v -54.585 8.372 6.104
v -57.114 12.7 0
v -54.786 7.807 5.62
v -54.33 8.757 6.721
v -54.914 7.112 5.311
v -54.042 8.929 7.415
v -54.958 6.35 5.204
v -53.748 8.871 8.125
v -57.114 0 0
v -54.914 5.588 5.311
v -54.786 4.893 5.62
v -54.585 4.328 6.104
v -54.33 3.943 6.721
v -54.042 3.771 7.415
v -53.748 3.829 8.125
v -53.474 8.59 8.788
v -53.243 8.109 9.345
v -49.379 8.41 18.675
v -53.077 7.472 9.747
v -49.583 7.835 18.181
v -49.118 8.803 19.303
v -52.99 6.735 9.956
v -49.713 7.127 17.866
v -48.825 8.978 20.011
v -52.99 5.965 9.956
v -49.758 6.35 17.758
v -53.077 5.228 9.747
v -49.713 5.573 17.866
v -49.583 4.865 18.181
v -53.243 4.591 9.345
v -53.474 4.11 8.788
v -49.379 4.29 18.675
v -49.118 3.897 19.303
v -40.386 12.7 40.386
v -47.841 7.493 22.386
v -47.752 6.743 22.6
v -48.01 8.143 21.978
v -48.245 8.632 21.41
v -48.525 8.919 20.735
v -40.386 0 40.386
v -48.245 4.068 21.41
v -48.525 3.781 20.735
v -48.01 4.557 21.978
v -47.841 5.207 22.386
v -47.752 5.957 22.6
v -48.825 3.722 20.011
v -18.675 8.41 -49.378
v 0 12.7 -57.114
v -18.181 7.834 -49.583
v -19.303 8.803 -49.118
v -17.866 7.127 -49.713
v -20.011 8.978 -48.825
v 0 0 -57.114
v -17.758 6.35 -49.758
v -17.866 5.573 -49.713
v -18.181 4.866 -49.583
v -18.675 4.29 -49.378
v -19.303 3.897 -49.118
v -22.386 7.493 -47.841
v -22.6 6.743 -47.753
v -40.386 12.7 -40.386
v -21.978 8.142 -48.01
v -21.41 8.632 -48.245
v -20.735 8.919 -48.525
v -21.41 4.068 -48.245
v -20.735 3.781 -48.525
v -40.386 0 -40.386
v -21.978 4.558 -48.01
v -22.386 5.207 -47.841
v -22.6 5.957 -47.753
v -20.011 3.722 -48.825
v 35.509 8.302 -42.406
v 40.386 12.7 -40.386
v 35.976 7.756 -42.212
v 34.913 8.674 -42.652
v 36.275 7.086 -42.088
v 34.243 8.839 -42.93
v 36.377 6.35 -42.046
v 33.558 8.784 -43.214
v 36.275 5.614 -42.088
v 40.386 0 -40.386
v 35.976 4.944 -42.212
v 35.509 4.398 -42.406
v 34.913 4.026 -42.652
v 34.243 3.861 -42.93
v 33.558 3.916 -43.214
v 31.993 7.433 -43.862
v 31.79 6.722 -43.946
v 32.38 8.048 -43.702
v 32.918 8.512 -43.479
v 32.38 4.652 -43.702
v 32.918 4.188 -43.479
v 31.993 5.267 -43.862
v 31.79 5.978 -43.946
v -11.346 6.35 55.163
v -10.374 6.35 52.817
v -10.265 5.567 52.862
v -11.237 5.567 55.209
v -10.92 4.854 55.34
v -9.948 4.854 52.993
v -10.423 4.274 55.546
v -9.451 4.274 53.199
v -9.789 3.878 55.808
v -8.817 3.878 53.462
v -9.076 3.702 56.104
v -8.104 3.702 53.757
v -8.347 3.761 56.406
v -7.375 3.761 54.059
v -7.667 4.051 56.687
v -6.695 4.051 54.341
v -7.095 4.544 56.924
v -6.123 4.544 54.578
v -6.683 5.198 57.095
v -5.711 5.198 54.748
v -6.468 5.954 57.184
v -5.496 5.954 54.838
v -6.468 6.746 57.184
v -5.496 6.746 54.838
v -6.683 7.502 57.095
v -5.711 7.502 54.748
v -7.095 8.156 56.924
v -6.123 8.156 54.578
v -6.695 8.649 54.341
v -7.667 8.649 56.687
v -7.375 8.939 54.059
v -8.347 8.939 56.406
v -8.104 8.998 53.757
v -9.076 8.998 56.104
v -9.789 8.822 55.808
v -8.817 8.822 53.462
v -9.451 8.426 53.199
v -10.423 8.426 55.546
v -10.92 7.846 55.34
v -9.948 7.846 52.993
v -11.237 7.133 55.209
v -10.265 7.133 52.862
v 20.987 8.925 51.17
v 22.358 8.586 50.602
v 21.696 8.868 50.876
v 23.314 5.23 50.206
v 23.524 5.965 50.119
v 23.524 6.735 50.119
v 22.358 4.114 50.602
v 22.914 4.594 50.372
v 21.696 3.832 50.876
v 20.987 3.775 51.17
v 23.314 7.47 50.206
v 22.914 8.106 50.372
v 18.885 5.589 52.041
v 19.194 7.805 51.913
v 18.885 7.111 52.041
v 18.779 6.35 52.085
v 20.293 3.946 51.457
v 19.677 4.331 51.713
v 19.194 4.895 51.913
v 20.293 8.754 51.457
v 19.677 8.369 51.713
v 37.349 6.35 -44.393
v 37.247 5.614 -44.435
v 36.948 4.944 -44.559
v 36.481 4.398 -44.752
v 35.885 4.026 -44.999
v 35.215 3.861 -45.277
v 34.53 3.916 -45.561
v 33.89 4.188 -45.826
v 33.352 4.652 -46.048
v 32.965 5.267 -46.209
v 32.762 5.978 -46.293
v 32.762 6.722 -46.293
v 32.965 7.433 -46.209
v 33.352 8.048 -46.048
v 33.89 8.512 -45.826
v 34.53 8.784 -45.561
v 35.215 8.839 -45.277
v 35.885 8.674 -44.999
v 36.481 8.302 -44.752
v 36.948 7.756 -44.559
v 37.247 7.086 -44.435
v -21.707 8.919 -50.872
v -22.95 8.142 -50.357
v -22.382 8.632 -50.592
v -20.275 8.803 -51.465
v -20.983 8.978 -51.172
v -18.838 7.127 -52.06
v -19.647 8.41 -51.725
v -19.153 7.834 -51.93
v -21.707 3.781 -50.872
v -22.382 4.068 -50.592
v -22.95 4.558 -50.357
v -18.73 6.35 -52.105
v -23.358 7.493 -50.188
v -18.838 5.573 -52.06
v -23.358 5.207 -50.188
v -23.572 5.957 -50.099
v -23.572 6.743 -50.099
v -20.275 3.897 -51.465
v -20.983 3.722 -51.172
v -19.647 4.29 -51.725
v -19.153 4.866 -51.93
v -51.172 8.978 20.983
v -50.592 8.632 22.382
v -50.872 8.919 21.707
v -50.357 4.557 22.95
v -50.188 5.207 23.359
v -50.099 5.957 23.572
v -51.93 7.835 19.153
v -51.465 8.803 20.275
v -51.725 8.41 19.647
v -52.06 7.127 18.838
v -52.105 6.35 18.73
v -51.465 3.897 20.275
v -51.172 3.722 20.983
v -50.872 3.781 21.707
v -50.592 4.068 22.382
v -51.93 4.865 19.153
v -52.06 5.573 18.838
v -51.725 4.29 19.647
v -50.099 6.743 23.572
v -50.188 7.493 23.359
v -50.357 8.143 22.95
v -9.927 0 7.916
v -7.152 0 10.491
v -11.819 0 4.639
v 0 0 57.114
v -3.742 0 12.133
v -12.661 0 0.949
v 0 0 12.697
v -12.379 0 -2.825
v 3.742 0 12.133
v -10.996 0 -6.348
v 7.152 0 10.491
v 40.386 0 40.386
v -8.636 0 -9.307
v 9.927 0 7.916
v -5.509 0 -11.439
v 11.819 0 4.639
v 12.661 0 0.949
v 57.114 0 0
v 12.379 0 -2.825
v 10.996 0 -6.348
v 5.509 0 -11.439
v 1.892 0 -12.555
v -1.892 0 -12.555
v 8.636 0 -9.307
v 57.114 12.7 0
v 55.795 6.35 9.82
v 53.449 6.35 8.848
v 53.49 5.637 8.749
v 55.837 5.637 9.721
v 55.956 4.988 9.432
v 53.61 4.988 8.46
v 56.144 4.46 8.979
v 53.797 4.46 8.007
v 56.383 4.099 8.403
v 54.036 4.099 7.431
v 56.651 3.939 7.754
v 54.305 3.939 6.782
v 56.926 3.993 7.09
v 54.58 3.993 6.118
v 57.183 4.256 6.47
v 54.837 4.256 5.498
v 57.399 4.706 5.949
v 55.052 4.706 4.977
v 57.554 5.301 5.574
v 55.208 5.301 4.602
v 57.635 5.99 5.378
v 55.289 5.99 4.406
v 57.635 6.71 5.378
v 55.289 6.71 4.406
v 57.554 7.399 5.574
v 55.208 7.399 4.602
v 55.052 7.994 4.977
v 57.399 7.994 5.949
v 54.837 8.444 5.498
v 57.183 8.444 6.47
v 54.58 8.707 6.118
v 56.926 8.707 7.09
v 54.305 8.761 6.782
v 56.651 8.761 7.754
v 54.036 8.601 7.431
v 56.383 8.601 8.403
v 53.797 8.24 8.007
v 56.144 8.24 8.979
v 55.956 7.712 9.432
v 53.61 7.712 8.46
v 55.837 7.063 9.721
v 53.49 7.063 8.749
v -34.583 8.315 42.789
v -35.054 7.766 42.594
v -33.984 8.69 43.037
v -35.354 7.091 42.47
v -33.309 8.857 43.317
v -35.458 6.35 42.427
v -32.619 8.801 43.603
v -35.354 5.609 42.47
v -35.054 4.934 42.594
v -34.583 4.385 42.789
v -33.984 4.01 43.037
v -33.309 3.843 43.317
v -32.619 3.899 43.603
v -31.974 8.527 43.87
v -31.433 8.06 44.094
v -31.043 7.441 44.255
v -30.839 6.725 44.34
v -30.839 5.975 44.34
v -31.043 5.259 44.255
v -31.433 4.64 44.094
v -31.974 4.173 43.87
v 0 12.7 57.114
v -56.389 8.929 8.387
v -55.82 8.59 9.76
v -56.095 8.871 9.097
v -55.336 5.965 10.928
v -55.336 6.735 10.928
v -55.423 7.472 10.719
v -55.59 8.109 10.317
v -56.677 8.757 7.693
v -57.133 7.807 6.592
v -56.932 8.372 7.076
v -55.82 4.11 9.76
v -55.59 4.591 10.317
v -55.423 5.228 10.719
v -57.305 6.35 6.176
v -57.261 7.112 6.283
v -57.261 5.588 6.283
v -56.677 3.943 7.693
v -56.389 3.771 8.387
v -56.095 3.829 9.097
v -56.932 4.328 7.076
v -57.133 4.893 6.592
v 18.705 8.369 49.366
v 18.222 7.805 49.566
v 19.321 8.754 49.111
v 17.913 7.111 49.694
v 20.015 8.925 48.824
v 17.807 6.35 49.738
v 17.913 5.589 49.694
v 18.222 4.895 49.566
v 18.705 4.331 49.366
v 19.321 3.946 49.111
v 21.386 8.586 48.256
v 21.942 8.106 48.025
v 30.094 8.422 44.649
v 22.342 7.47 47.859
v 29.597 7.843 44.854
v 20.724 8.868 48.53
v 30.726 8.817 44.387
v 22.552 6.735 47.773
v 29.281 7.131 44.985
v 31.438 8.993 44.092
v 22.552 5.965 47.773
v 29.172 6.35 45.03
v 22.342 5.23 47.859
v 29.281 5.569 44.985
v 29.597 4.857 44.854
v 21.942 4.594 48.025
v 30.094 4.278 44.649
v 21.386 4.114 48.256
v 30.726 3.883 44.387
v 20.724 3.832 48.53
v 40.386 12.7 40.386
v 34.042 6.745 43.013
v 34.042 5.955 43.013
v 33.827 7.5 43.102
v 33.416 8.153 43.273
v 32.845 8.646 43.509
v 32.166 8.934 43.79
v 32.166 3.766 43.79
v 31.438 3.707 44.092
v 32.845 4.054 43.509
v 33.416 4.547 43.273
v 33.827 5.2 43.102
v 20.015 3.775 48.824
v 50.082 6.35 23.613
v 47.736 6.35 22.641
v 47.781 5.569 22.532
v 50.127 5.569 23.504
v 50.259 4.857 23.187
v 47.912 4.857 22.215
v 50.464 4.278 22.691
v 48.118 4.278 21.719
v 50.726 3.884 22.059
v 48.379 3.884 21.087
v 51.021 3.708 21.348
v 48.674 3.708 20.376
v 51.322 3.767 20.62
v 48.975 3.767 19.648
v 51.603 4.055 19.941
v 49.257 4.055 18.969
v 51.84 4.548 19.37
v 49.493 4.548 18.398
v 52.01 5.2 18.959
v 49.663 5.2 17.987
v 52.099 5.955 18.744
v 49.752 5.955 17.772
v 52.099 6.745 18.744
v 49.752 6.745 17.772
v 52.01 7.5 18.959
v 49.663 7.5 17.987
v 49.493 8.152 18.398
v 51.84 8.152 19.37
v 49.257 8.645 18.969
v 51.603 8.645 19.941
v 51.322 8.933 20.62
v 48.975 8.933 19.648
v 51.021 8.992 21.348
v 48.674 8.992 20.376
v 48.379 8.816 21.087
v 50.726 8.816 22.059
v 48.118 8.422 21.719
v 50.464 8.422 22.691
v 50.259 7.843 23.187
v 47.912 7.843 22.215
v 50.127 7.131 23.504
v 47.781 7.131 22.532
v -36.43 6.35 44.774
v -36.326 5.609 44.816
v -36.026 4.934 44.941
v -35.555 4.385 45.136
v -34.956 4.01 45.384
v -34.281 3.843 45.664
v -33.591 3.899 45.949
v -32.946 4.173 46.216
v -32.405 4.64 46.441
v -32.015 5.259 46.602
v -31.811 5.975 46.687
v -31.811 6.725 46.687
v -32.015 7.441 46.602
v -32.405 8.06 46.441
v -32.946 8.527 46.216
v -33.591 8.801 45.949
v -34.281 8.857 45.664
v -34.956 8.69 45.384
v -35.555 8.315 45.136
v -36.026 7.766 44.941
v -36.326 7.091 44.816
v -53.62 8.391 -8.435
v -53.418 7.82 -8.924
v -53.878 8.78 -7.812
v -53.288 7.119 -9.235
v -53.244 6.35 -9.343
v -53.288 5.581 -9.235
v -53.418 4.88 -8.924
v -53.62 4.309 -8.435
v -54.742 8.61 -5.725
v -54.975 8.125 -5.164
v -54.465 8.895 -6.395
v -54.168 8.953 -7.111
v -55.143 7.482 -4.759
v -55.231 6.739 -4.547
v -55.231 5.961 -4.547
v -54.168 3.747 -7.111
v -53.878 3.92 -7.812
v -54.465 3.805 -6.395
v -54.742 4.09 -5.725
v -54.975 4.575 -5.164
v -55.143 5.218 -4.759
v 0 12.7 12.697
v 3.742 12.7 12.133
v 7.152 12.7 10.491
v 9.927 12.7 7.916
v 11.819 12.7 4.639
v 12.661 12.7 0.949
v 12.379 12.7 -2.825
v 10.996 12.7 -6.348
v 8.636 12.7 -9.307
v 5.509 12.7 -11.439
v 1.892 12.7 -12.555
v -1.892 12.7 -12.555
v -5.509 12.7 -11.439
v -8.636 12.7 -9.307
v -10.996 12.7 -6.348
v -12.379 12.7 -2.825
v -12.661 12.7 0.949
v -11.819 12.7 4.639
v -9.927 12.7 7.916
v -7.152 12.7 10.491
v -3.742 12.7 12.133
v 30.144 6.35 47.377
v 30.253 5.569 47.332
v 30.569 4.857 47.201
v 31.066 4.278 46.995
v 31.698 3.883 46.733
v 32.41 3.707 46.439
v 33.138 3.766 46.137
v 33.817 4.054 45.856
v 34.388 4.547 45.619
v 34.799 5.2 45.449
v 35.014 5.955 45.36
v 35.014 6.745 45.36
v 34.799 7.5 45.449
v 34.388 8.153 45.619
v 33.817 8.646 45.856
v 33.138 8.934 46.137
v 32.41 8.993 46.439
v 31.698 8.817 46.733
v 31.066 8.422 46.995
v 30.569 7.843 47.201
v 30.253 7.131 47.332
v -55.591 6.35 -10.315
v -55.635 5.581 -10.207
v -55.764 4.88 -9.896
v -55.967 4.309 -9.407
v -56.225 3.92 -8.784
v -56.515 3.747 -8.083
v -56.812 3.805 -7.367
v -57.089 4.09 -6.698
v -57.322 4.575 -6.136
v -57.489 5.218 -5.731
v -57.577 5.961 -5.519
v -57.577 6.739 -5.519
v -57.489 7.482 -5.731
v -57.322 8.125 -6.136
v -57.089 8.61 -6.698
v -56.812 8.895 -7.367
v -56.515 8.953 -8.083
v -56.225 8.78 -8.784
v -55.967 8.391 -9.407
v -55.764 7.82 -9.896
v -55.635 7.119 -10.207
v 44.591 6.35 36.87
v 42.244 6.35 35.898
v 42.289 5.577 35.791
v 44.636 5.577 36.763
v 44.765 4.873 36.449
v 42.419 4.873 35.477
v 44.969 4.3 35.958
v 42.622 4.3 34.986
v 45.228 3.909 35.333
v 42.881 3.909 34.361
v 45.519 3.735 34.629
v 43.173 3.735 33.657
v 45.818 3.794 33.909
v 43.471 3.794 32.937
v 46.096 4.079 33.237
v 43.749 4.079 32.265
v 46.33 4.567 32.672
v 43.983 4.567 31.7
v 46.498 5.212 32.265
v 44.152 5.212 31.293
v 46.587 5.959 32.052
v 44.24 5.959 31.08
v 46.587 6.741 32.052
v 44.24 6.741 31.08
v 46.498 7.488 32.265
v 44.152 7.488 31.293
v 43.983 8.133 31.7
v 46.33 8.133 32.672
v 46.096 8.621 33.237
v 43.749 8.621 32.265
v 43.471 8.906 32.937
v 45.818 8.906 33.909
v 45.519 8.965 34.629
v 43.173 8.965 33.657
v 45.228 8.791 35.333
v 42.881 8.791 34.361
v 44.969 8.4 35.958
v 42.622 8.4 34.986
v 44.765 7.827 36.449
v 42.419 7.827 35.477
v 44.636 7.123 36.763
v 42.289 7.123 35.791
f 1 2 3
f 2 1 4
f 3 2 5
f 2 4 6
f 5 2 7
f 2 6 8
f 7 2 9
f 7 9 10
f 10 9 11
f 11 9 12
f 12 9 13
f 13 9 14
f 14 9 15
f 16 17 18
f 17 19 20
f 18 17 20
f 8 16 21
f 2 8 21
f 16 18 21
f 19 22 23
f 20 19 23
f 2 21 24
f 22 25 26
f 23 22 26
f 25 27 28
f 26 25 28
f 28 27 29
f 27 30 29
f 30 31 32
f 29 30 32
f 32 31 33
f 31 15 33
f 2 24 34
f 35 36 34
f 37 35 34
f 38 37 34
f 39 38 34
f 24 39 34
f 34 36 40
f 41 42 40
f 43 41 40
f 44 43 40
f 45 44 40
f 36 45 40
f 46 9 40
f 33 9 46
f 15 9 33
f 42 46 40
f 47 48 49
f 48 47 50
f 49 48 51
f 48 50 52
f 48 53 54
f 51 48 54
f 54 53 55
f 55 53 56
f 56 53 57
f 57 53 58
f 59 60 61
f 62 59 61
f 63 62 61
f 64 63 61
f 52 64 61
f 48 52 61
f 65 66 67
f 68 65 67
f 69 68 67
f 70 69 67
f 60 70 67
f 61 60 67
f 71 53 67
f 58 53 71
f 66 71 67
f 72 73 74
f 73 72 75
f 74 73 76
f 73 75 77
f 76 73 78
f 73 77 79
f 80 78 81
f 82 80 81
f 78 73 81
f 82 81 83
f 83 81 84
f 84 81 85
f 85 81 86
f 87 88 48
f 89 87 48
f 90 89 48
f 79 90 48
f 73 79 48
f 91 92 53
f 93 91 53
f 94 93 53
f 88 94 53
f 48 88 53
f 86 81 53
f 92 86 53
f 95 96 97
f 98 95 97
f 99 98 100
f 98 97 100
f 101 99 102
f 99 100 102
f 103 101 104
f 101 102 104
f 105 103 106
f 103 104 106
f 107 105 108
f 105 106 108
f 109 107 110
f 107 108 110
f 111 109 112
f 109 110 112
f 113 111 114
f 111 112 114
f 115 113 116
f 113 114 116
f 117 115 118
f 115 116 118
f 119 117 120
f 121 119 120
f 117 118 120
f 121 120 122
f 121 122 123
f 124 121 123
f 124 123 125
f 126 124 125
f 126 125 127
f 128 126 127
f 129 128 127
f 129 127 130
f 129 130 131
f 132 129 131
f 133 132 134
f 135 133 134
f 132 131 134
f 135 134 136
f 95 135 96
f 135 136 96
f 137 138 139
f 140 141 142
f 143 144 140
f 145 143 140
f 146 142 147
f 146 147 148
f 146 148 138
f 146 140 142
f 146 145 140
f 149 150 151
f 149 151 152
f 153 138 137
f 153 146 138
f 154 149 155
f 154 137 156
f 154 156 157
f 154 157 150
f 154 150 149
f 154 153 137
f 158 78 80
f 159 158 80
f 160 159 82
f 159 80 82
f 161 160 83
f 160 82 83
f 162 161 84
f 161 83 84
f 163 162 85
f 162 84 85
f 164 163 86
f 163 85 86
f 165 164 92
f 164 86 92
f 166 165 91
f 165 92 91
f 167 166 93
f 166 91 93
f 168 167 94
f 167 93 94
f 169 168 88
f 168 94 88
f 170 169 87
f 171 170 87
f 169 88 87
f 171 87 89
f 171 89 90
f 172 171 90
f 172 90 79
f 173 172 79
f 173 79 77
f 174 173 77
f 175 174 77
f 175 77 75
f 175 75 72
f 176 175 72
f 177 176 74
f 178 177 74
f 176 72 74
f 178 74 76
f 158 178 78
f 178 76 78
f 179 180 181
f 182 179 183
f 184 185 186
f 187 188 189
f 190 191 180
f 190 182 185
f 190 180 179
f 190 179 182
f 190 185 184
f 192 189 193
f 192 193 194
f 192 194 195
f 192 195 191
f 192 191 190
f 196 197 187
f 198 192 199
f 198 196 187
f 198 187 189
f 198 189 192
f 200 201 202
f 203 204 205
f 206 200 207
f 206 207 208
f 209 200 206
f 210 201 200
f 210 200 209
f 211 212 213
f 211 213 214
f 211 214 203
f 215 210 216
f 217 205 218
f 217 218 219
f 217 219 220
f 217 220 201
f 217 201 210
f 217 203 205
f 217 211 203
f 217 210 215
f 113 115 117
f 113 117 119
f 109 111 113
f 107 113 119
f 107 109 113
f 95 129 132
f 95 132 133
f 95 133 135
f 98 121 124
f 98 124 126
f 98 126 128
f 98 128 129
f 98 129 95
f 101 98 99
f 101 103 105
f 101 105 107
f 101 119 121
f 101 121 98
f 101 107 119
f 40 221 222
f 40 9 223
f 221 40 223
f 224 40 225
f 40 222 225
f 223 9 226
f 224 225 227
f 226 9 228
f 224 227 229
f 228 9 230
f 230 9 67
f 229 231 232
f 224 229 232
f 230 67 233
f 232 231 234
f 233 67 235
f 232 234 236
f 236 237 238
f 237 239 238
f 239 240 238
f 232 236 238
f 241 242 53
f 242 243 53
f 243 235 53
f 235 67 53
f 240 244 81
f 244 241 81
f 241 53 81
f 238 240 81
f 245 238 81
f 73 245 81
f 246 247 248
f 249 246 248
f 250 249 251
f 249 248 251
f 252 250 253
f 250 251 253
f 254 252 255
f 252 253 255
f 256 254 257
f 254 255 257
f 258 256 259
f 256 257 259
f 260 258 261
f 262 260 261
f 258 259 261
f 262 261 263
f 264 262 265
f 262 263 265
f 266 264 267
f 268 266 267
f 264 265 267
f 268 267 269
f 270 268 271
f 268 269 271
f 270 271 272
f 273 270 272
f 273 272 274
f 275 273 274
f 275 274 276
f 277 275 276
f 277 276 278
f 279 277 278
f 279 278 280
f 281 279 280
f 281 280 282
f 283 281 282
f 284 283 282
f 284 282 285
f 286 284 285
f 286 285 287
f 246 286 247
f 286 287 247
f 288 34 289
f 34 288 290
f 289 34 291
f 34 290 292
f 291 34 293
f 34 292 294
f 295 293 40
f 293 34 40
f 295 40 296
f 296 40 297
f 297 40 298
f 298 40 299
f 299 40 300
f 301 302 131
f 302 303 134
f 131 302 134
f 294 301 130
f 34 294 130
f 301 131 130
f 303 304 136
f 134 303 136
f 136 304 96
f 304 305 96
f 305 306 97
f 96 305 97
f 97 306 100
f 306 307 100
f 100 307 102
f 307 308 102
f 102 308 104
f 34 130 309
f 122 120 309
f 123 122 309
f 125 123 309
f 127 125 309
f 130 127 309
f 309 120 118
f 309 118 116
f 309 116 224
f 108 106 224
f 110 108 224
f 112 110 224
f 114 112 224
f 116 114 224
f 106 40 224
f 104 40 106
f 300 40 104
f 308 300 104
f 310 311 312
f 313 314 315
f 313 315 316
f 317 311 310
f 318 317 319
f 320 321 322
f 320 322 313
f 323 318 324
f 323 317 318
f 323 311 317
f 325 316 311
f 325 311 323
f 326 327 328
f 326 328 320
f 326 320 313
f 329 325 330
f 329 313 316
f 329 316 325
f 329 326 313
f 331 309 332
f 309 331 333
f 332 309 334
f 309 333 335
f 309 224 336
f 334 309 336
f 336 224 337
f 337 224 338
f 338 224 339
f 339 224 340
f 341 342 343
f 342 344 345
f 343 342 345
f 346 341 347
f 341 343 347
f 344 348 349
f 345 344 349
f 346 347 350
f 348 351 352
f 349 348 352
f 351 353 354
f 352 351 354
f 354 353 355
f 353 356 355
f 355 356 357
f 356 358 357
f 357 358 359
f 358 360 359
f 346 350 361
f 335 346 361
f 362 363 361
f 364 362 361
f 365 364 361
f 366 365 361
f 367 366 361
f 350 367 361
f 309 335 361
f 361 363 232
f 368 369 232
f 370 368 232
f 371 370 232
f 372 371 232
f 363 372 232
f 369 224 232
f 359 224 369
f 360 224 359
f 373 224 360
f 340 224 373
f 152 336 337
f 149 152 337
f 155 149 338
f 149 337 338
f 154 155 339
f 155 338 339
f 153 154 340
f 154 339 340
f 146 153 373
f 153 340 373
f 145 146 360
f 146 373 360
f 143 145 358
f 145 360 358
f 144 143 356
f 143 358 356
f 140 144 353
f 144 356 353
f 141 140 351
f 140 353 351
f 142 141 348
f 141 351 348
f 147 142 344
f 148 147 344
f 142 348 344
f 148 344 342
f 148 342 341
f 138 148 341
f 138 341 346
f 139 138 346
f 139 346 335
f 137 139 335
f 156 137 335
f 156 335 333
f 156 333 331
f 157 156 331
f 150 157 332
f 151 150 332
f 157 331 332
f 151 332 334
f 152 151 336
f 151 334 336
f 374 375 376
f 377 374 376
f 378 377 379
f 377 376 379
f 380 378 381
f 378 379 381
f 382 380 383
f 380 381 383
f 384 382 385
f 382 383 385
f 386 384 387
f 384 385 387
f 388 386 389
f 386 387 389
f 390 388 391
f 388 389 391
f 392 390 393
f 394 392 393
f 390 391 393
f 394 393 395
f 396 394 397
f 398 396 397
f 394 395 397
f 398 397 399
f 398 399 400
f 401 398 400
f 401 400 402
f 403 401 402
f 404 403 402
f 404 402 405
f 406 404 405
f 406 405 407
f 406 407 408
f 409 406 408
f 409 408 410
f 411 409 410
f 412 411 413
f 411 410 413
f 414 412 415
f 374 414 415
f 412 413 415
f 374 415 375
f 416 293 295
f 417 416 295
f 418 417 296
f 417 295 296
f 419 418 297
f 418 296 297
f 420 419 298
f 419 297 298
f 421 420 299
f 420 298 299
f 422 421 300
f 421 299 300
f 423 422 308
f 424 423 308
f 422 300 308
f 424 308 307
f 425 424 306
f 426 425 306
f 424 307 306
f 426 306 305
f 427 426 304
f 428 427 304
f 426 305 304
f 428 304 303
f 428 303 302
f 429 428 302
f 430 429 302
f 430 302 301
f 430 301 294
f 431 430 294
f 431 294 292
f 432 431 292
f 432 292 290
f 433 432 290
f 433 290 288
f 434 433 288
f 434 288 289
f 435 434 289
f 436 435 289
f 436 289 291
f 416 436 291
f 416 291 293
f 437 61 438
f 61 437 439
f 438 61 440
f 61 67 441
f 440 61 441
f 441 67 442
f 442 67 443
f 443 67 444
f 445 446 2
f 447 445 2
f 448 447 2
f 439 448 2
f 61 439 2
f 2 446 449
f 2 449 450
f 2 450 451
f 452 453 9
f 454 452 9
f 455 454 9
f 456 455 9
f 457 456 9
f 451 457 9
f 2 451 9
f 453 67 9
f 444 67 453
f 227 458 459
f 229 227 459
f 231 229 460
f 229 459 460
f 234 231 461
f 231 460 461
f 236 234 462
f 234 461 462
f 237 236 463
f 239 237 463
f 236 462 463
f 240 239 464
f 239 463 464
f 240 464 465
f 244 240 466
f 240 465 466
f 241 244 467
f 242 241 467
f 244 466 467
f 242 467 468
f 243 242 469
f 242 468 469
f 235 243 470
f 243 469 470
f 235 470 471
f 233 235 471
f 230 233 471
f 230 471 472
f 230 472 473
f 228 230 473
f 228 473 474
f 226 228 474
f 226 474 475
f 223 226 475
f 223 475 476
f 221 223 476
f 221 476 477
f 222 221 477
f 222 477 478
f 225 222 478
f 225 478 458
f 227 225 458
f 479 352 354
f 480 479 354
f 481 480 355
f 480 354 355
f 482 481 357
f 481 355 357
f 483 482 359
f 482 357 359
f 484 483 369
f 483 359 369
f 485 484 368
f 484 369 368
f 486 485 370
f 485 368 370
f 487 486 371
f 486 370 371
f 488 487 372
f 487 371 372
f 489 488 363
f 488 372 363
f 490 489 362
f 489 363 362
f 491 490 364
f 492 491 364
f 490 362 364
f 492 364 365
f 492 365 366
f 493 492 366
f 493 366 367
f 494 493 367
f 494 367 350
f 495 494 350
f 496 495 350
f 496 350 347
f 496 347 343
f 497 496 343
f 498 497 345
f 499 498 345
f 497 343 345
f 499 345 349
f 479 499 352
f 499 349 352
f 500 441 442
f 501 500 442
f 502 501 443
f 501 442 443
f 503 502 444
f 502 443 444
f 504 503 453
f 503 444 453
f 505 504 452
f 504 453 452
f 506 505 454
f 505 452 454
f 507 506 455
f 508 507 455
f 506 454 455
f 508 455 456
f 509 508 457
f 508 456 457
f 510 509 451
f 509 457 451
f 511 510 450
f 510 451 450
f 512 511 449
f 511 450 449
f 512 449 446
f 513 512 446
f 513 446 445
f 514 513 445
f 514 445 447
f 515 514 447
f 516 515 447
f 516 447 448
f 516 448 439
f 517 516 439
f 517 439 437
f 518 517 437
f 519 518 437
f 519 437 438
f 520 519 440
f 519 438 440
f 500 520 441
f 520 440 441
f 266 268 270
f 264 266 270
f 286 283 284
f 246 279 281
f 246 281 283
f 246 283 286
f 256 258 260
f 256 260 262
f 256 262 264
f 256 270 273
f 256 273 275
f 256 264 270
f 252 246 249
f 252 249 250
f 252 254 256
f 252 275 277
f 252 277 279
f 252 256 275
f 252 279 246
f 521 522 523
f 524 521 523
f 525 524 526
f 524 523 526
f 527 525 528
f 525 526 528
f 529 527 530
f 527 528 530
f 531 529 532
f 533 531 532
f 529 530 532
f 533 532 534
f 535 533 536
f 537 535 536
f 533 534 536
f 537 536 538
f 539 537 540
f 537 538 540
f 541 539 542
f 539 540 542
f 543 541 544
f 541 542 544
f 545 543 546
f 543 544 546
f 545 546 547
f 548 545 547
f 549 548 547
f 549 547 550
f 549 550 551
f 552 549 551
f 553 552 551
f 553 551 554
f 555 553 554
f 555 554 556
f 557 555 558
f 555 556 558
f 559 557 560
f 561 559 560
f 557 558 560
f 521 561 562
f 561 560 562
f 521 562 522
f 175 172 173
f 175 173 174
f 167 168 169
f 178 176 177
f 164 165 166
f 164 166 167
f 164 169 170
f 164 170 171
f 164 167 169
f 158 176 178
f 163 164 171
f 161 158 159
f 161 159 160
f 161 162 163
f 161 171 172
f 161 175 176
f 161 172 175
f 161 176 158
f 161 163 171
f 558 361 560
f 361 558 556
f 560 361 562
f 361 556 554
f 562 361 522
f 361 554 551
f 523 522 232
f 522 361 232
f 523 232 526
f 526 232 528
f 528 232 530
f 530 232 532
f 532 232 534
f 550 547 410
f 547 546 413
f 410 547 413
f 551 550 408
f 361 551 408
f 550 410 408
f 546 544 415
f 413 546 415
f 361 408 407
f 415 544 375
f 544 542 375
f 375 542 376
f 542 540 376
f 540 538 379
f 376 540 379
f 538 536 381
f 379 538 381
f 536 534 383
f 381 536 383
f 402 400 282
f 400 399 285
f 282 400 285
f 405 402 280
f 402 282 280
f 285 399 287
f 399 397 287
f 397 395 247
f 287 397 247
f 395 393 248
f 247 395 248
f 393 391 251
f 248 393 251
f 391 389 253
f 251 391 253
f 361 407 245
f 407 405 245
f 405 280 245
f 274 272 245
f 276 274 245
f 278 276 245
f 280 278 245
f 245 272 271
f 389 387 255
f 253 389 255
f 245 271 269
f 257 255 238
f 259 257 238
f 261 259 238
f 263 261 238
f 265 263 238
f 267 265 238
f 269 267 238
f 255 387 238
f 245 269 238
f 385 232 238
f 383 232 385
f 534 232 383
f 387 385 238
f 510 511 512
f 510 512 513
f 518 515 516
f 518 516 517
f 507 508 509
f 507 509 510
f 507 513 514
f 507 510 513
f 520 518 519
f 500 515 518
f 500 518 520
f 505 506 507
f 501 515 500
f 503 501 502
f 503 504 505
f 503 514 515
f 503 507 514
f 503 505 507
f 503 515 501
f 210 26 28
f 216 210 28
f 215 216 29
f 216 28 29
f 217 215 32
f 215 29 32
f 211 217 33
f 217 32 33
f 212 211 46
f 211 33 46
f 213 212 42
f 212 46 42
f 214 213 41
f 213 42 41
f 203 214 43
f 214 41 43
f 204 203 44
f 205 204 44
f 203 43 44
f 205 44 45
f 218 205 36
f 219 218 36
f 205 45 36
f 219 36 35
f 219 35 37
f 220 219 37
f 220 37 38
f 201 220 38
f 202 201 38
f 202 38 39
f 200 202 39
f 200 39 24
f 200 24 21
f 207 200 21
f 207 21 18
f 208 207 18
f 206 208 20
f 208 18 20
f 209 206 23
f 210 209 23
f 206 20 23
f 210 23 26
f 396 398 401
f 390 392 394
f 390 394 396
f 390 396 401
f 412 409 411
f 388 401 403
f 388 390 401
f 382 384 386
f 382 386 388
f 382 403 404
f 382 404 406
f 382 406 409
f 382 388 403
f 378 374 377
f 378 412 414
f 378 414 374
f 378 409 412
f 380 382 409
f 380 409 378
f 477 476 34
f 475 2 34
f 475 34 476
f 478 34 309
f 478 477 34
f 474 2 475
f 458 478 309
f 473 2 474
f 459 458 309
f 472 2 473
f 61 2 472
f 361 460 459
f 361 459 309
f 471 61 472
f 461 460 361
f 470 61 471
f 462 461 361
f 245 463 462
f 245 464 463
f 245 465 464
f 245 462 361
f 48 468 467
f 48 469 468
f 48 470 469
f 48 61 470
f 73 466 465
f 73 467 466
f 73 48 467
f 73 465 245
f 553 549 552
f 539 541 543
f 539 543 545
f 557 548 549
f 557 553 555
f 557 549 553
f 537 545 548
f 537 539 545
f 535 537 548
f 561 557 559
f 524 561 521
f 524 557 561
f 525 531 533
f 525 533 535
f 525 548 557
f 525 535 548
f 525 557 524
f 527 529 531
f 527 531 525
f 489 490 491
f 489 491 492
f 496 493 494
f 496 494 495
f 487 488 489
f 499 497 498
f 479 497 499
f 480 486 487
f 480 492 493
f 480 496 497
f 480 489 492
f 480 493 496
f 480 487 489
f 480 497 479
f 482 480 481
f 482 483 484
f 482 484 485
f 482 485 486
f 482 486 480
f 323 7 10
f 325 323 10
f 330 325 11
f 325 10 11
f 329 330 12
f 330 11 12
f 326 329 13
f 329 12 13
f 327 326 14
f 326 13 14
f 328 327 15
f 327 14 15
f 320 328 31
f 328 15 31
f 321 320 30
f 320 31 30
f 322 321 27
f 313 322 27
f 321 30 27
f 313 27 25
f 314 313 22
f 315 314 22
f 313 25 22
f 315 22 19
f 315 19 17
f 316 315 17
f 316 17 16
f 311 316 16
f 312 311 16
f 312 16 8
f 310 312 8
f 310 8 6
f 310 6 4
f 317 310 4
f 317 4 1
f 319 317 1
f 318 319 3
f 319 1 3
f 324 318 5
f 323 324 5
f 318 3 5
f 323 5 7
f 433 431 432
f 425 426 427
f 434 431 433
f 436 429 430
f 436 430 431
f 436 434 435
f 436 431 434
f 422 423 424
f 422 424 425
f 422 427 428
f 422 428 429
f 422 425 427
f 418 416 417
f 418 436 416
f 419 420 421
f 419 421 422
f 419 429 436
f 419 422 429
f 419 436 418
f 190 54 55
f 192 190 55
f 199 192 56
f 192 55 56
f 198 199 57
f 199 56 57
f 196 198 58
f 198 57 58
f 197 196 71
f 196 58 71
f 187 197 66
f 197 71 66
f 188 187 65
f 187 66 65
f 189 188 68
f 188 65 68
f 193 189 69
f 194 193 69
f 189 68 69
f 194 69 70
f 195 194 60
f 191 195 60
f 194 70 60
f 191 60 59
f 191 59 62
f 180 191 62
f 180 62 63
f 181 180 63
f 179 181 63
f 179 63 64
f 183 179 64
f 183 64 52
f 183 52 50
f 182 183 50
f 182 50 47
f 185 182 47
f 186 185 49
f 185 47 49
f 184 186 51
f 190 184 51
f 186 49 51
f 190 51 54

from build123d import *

# Parameters (mm, degrees)
BOSS_EXTRUDE1_DEPTH      = 12.7
SKETCH6_R                = 2.582336278
BOSS_EXTRUDE5_DEPTH      = 2.54
SKETCH8_R                = 2.650649738
BOSS_EXTRUDE7_DEPTH      = 2.54
SKETCH9_R                = 2.655151376
BOSS_EXTRUDE8_DEPTH      = 2.54
BOSS_EXTRUDE9_DEPTH      = 2.54
BOSS_EXTRUDE9_DEPTH_BACK = 2.032
SKETCH10_R               = 2.513561162
SKETCH11_R               = 2.58621177
BOSS_EXTRUDE10_DEPTH     = 2.54
SKETCH12_R               = 2.635427952
BOSS_EXTRUDE11_DEPTH     = 2.54
SKETCH13_R               = 2.610060734
BOSS_EXTRUDE12_DEPTH     = 2.54
SKETCH14_R               = 2.635257061
BOSS_EXTRUDE13_DEPTH     = 2.54
SKETCH15_R               = 2.496375984
BOSS_EXTRUDE14_DEPTH     = 2.54
SKETCH16_R               = 2.621965254
BOSS_EXTRUDE15_DEPTH     = 2.54
SKETCH17_R               = 2.649584499
BOSS_EXTRUDE16_DEPTH     = 2.54
SKETCH18_R               = 2.417668351
BOSS_EXTRUDE17_DEPTH     = 2.54
SKETCH25_R               = 12.696845274
CUT_EXTRUDE1_DEPTH       = 12.954


with BuildPart() as part:
    # Sketch2 → Boss-Extrude1 (new body)
    with BuildSketch(Plane(origin=(0, 0, 0), x_dir=(1, 0, 0), z_dir=(0, 1, 0))):
        Polygon((57.113851186, 0), (40.385591473, 40.385591473), (0, 57.113851186), (-40.385591473, 40.385591473), (-57.113851186, 0), (-40.385591473, -40.385591473), (0, -57.113851186), (40.385591473, -40.385591473), align=None)
    extrude(amount=BOSS_EXTRUDE1_DEPTH)

    # Sketch6 → Boss-Extrude5 (add)
    with BuildSketch(Plane(origin=(20.192795737, 0, 48.749721329), x_dir=(0.9238795325112822, 0, -0.38268343236510083), z_dir=(0.38268343236510083, 0, 0.9238795325112822))):
        with Locations(Location((0, 6.35, 0), (0, 0, 180))):
            Circle(SKETCH6_R)
    extrude(amount=BOSS_EXTRUDE5_DEPTH)

    # Sketch8 → Boss-Extrude7 (add)
    with BuildSketch(Plane(origin=(20.192795737, 0, 48.749721329), x_dir=(0.9238795325112822, 0, -0.38268343236510083), z_dir=(0.38268343236510083, 0, 0.9238795325112822))):
        with Locations(Location((12.369517224, 6.35, 0), (0, 0, 180))):
            Circle(SKETCH8_R)
    extrude(amount=BOSS_EXTRUDE7_DEPTH)

    # Sketch9 → Boss-Extrude8 (add)
    with BuildSketch(Plane(origin=(-20.192795737, 0, 48.749721329), x_dir=(0.9238795325112911, 0, 0.38268343236507935), z_dir=(-0.38268343236507935, 0, 0.9238795325112911))):
        with Locations(Location((13.282722146, 6.35, 0), (0, 0, 180))):
            Circle(SKETCH9_R)
    extrude(amount=BOSS_EXTRUDE8_DEPTH)

    # Sketch10 → Boss-Extrude9 (add, two sides: drawn at the far end of the back side and taken through both)
    with BuildSketch(Plane(origin=(-20.192795737, 0, 48.749721329), x_dir=(0.9238795325112911, 0, 0.38268343236507935), z_dir=(-0.38268343236507935, 0, 0.9238795325112911)).offset(-BOSS_EXTRUDE9_DEPTH_BACK)):
        with Locations(Location((-14.008863044, 6.35, 0), (0, 0, 180))):
            Circle(SKETCH10_R)
    extrude(amount=BOSS_EXTRUDE9_DEPTH + BOSS_EXTRUDE9_DEPTH_BACK)

    # Sketch11 → Boss-Extrude10 (add)
    with BuildSketch(Plane(origin=(-48.749721329, 0, 20.192795737), x_dir=(0.3826834323651003, 0, 0.9238795325112825), z_dir=(-0.9238795325112825, 0, 0.3826834323651003))):
        with Locations(Location((-13.637069306, 6.35, 0), (0, 0, 180))):
            Circle(SKETCH11_R)
    extrude(amount=BOSS_EXTRUDE10_DEPTH)

    # Sketch12 → Boss-Extrude11 (add)
    with BuildSketch(Plane(origin=(-48.749721329, 0, 20.192795737), x_dir=(0.3826834323651003, 0, 0.9238795325112825), z_dir=(-0.9238795325112825, 0, 0.3826834323651003))):
        with Locations(Location((0, 6.35, 0), (0, 0, 180))):
            Circle(SKETCH12_R)
    extrude(amount=BOSS_EXTRUDE11_DEPTH)

    # Sketch13 → Boss-Extrude12 (add)
    with BuildSketch(Plane(origin=(-48.749721329, 0, -20.192795737), x_dir=(-0.38268343236507907, 0, 0.9238795325112913), z_dir=(-0.9238795325112913, 0, -0.38268343236507907))):
        with Locations(Location((14.354264816, 6.35, 0), (0, 0, 180))):
            Circle(SKETCH13_R)
    extrude(amount=BOSS_EXTRUDE12_DEPTH)

    # Sketch14 → Boss-Extrude13 (add)
    with BuildSketch(Plane(origin=(-20.192795737, 0, -48.749721329), x_dir=(-0.9238795325112825, 0, 0.3826834323651002), z_dir=(-0.3826834323651002, 0, -0.9238795325112825))):
        with Locations(Location((0, 6.35, 0), (0, 0, 180))):
            Circle(SKETCH14_R)
    extrude(amount=BOSS_EXTRUDE13_DEPTH)

    # Sketch15 → Boss-Extrude14 (add)
    with BuildSketch(Plane(origin=(20.192795737, 0, -48.749721329), x_dir=(-0.9238795325112913, 0, -0.38268343236507896), z_dir=(0.3826834323650789, 0, -0.9238795325112912))):
        with Locations(Location((-15.021400656, 6.35, 0), (0, 0, 180))):
            Circle(SKETCH15_R)
    extrude(amount=BOSS_EXTRUDE14_DEPTH)

    # Sketch16 → Boss-Extrude15 (add)
    with BuildSketch(Plane(origin=(48.749721329, 0, 20.192795737), x_dir=(0.3826834323650791, 0, -0.9238795325112912), z_dir=(0.9238795325112913, 0, 0.3826834323650792))):
        with Locations(Location((-14.377366693, 6.35, 0), (0, 0, 180))):
            Circle(SKETCH16_R)
    extrude(amount=BOSS_EXTRUDE15_DEPTH)

    # Sketch17 → Boss-Extrude16 (add)
    with BuildSketch(Plane(origin=(48.749721329, 0, 20.192795737), x_dir=(0.3826834323650791, 0, -0.9238795325112912), z_dir=(0.9238795325112913, 0, 0.3826834323650792))):
        with Locations(Location((0, 6.35, 0), (0, 0, 180))):
            Circle(SKETCH17_R)
    extrude(amount=BOSS_EXTRUDE16_DEPTH)

    # Sketch18 → Boss-Extrude17 (add)
    with BuildSketch(Plane(origin=(48.749721329, 0, 20.192795737), x_dir=(0.3826834323650791, 0, -0.9238795325112912), z_dir=(0.9238795325112913, 0, 0.3826834323650792))):
        with Locations(Location((14.696818613, 6.35, 0), (0, 0, 180))):
            Circle(SKETCH18_R)
    extrude(amount=BOSS_EXTRUDE17_DEPTH)

    # Sketch25 → Cut-Extrude1 (cut)
    with BuildSketch(Plane(origin=(0, 12.7, 0), x_dir=(1, 0, 0), z_dir=(0, 1, 0))):
        with Locations(Location((0, 0, 0), (0, 0, 270))):
            Circle(SKETCH25_R)
    extrude(amount=-CUT_EXTRUDE1_DEPTH, mode=Mode.SUBTRACT)


solid = part.part
